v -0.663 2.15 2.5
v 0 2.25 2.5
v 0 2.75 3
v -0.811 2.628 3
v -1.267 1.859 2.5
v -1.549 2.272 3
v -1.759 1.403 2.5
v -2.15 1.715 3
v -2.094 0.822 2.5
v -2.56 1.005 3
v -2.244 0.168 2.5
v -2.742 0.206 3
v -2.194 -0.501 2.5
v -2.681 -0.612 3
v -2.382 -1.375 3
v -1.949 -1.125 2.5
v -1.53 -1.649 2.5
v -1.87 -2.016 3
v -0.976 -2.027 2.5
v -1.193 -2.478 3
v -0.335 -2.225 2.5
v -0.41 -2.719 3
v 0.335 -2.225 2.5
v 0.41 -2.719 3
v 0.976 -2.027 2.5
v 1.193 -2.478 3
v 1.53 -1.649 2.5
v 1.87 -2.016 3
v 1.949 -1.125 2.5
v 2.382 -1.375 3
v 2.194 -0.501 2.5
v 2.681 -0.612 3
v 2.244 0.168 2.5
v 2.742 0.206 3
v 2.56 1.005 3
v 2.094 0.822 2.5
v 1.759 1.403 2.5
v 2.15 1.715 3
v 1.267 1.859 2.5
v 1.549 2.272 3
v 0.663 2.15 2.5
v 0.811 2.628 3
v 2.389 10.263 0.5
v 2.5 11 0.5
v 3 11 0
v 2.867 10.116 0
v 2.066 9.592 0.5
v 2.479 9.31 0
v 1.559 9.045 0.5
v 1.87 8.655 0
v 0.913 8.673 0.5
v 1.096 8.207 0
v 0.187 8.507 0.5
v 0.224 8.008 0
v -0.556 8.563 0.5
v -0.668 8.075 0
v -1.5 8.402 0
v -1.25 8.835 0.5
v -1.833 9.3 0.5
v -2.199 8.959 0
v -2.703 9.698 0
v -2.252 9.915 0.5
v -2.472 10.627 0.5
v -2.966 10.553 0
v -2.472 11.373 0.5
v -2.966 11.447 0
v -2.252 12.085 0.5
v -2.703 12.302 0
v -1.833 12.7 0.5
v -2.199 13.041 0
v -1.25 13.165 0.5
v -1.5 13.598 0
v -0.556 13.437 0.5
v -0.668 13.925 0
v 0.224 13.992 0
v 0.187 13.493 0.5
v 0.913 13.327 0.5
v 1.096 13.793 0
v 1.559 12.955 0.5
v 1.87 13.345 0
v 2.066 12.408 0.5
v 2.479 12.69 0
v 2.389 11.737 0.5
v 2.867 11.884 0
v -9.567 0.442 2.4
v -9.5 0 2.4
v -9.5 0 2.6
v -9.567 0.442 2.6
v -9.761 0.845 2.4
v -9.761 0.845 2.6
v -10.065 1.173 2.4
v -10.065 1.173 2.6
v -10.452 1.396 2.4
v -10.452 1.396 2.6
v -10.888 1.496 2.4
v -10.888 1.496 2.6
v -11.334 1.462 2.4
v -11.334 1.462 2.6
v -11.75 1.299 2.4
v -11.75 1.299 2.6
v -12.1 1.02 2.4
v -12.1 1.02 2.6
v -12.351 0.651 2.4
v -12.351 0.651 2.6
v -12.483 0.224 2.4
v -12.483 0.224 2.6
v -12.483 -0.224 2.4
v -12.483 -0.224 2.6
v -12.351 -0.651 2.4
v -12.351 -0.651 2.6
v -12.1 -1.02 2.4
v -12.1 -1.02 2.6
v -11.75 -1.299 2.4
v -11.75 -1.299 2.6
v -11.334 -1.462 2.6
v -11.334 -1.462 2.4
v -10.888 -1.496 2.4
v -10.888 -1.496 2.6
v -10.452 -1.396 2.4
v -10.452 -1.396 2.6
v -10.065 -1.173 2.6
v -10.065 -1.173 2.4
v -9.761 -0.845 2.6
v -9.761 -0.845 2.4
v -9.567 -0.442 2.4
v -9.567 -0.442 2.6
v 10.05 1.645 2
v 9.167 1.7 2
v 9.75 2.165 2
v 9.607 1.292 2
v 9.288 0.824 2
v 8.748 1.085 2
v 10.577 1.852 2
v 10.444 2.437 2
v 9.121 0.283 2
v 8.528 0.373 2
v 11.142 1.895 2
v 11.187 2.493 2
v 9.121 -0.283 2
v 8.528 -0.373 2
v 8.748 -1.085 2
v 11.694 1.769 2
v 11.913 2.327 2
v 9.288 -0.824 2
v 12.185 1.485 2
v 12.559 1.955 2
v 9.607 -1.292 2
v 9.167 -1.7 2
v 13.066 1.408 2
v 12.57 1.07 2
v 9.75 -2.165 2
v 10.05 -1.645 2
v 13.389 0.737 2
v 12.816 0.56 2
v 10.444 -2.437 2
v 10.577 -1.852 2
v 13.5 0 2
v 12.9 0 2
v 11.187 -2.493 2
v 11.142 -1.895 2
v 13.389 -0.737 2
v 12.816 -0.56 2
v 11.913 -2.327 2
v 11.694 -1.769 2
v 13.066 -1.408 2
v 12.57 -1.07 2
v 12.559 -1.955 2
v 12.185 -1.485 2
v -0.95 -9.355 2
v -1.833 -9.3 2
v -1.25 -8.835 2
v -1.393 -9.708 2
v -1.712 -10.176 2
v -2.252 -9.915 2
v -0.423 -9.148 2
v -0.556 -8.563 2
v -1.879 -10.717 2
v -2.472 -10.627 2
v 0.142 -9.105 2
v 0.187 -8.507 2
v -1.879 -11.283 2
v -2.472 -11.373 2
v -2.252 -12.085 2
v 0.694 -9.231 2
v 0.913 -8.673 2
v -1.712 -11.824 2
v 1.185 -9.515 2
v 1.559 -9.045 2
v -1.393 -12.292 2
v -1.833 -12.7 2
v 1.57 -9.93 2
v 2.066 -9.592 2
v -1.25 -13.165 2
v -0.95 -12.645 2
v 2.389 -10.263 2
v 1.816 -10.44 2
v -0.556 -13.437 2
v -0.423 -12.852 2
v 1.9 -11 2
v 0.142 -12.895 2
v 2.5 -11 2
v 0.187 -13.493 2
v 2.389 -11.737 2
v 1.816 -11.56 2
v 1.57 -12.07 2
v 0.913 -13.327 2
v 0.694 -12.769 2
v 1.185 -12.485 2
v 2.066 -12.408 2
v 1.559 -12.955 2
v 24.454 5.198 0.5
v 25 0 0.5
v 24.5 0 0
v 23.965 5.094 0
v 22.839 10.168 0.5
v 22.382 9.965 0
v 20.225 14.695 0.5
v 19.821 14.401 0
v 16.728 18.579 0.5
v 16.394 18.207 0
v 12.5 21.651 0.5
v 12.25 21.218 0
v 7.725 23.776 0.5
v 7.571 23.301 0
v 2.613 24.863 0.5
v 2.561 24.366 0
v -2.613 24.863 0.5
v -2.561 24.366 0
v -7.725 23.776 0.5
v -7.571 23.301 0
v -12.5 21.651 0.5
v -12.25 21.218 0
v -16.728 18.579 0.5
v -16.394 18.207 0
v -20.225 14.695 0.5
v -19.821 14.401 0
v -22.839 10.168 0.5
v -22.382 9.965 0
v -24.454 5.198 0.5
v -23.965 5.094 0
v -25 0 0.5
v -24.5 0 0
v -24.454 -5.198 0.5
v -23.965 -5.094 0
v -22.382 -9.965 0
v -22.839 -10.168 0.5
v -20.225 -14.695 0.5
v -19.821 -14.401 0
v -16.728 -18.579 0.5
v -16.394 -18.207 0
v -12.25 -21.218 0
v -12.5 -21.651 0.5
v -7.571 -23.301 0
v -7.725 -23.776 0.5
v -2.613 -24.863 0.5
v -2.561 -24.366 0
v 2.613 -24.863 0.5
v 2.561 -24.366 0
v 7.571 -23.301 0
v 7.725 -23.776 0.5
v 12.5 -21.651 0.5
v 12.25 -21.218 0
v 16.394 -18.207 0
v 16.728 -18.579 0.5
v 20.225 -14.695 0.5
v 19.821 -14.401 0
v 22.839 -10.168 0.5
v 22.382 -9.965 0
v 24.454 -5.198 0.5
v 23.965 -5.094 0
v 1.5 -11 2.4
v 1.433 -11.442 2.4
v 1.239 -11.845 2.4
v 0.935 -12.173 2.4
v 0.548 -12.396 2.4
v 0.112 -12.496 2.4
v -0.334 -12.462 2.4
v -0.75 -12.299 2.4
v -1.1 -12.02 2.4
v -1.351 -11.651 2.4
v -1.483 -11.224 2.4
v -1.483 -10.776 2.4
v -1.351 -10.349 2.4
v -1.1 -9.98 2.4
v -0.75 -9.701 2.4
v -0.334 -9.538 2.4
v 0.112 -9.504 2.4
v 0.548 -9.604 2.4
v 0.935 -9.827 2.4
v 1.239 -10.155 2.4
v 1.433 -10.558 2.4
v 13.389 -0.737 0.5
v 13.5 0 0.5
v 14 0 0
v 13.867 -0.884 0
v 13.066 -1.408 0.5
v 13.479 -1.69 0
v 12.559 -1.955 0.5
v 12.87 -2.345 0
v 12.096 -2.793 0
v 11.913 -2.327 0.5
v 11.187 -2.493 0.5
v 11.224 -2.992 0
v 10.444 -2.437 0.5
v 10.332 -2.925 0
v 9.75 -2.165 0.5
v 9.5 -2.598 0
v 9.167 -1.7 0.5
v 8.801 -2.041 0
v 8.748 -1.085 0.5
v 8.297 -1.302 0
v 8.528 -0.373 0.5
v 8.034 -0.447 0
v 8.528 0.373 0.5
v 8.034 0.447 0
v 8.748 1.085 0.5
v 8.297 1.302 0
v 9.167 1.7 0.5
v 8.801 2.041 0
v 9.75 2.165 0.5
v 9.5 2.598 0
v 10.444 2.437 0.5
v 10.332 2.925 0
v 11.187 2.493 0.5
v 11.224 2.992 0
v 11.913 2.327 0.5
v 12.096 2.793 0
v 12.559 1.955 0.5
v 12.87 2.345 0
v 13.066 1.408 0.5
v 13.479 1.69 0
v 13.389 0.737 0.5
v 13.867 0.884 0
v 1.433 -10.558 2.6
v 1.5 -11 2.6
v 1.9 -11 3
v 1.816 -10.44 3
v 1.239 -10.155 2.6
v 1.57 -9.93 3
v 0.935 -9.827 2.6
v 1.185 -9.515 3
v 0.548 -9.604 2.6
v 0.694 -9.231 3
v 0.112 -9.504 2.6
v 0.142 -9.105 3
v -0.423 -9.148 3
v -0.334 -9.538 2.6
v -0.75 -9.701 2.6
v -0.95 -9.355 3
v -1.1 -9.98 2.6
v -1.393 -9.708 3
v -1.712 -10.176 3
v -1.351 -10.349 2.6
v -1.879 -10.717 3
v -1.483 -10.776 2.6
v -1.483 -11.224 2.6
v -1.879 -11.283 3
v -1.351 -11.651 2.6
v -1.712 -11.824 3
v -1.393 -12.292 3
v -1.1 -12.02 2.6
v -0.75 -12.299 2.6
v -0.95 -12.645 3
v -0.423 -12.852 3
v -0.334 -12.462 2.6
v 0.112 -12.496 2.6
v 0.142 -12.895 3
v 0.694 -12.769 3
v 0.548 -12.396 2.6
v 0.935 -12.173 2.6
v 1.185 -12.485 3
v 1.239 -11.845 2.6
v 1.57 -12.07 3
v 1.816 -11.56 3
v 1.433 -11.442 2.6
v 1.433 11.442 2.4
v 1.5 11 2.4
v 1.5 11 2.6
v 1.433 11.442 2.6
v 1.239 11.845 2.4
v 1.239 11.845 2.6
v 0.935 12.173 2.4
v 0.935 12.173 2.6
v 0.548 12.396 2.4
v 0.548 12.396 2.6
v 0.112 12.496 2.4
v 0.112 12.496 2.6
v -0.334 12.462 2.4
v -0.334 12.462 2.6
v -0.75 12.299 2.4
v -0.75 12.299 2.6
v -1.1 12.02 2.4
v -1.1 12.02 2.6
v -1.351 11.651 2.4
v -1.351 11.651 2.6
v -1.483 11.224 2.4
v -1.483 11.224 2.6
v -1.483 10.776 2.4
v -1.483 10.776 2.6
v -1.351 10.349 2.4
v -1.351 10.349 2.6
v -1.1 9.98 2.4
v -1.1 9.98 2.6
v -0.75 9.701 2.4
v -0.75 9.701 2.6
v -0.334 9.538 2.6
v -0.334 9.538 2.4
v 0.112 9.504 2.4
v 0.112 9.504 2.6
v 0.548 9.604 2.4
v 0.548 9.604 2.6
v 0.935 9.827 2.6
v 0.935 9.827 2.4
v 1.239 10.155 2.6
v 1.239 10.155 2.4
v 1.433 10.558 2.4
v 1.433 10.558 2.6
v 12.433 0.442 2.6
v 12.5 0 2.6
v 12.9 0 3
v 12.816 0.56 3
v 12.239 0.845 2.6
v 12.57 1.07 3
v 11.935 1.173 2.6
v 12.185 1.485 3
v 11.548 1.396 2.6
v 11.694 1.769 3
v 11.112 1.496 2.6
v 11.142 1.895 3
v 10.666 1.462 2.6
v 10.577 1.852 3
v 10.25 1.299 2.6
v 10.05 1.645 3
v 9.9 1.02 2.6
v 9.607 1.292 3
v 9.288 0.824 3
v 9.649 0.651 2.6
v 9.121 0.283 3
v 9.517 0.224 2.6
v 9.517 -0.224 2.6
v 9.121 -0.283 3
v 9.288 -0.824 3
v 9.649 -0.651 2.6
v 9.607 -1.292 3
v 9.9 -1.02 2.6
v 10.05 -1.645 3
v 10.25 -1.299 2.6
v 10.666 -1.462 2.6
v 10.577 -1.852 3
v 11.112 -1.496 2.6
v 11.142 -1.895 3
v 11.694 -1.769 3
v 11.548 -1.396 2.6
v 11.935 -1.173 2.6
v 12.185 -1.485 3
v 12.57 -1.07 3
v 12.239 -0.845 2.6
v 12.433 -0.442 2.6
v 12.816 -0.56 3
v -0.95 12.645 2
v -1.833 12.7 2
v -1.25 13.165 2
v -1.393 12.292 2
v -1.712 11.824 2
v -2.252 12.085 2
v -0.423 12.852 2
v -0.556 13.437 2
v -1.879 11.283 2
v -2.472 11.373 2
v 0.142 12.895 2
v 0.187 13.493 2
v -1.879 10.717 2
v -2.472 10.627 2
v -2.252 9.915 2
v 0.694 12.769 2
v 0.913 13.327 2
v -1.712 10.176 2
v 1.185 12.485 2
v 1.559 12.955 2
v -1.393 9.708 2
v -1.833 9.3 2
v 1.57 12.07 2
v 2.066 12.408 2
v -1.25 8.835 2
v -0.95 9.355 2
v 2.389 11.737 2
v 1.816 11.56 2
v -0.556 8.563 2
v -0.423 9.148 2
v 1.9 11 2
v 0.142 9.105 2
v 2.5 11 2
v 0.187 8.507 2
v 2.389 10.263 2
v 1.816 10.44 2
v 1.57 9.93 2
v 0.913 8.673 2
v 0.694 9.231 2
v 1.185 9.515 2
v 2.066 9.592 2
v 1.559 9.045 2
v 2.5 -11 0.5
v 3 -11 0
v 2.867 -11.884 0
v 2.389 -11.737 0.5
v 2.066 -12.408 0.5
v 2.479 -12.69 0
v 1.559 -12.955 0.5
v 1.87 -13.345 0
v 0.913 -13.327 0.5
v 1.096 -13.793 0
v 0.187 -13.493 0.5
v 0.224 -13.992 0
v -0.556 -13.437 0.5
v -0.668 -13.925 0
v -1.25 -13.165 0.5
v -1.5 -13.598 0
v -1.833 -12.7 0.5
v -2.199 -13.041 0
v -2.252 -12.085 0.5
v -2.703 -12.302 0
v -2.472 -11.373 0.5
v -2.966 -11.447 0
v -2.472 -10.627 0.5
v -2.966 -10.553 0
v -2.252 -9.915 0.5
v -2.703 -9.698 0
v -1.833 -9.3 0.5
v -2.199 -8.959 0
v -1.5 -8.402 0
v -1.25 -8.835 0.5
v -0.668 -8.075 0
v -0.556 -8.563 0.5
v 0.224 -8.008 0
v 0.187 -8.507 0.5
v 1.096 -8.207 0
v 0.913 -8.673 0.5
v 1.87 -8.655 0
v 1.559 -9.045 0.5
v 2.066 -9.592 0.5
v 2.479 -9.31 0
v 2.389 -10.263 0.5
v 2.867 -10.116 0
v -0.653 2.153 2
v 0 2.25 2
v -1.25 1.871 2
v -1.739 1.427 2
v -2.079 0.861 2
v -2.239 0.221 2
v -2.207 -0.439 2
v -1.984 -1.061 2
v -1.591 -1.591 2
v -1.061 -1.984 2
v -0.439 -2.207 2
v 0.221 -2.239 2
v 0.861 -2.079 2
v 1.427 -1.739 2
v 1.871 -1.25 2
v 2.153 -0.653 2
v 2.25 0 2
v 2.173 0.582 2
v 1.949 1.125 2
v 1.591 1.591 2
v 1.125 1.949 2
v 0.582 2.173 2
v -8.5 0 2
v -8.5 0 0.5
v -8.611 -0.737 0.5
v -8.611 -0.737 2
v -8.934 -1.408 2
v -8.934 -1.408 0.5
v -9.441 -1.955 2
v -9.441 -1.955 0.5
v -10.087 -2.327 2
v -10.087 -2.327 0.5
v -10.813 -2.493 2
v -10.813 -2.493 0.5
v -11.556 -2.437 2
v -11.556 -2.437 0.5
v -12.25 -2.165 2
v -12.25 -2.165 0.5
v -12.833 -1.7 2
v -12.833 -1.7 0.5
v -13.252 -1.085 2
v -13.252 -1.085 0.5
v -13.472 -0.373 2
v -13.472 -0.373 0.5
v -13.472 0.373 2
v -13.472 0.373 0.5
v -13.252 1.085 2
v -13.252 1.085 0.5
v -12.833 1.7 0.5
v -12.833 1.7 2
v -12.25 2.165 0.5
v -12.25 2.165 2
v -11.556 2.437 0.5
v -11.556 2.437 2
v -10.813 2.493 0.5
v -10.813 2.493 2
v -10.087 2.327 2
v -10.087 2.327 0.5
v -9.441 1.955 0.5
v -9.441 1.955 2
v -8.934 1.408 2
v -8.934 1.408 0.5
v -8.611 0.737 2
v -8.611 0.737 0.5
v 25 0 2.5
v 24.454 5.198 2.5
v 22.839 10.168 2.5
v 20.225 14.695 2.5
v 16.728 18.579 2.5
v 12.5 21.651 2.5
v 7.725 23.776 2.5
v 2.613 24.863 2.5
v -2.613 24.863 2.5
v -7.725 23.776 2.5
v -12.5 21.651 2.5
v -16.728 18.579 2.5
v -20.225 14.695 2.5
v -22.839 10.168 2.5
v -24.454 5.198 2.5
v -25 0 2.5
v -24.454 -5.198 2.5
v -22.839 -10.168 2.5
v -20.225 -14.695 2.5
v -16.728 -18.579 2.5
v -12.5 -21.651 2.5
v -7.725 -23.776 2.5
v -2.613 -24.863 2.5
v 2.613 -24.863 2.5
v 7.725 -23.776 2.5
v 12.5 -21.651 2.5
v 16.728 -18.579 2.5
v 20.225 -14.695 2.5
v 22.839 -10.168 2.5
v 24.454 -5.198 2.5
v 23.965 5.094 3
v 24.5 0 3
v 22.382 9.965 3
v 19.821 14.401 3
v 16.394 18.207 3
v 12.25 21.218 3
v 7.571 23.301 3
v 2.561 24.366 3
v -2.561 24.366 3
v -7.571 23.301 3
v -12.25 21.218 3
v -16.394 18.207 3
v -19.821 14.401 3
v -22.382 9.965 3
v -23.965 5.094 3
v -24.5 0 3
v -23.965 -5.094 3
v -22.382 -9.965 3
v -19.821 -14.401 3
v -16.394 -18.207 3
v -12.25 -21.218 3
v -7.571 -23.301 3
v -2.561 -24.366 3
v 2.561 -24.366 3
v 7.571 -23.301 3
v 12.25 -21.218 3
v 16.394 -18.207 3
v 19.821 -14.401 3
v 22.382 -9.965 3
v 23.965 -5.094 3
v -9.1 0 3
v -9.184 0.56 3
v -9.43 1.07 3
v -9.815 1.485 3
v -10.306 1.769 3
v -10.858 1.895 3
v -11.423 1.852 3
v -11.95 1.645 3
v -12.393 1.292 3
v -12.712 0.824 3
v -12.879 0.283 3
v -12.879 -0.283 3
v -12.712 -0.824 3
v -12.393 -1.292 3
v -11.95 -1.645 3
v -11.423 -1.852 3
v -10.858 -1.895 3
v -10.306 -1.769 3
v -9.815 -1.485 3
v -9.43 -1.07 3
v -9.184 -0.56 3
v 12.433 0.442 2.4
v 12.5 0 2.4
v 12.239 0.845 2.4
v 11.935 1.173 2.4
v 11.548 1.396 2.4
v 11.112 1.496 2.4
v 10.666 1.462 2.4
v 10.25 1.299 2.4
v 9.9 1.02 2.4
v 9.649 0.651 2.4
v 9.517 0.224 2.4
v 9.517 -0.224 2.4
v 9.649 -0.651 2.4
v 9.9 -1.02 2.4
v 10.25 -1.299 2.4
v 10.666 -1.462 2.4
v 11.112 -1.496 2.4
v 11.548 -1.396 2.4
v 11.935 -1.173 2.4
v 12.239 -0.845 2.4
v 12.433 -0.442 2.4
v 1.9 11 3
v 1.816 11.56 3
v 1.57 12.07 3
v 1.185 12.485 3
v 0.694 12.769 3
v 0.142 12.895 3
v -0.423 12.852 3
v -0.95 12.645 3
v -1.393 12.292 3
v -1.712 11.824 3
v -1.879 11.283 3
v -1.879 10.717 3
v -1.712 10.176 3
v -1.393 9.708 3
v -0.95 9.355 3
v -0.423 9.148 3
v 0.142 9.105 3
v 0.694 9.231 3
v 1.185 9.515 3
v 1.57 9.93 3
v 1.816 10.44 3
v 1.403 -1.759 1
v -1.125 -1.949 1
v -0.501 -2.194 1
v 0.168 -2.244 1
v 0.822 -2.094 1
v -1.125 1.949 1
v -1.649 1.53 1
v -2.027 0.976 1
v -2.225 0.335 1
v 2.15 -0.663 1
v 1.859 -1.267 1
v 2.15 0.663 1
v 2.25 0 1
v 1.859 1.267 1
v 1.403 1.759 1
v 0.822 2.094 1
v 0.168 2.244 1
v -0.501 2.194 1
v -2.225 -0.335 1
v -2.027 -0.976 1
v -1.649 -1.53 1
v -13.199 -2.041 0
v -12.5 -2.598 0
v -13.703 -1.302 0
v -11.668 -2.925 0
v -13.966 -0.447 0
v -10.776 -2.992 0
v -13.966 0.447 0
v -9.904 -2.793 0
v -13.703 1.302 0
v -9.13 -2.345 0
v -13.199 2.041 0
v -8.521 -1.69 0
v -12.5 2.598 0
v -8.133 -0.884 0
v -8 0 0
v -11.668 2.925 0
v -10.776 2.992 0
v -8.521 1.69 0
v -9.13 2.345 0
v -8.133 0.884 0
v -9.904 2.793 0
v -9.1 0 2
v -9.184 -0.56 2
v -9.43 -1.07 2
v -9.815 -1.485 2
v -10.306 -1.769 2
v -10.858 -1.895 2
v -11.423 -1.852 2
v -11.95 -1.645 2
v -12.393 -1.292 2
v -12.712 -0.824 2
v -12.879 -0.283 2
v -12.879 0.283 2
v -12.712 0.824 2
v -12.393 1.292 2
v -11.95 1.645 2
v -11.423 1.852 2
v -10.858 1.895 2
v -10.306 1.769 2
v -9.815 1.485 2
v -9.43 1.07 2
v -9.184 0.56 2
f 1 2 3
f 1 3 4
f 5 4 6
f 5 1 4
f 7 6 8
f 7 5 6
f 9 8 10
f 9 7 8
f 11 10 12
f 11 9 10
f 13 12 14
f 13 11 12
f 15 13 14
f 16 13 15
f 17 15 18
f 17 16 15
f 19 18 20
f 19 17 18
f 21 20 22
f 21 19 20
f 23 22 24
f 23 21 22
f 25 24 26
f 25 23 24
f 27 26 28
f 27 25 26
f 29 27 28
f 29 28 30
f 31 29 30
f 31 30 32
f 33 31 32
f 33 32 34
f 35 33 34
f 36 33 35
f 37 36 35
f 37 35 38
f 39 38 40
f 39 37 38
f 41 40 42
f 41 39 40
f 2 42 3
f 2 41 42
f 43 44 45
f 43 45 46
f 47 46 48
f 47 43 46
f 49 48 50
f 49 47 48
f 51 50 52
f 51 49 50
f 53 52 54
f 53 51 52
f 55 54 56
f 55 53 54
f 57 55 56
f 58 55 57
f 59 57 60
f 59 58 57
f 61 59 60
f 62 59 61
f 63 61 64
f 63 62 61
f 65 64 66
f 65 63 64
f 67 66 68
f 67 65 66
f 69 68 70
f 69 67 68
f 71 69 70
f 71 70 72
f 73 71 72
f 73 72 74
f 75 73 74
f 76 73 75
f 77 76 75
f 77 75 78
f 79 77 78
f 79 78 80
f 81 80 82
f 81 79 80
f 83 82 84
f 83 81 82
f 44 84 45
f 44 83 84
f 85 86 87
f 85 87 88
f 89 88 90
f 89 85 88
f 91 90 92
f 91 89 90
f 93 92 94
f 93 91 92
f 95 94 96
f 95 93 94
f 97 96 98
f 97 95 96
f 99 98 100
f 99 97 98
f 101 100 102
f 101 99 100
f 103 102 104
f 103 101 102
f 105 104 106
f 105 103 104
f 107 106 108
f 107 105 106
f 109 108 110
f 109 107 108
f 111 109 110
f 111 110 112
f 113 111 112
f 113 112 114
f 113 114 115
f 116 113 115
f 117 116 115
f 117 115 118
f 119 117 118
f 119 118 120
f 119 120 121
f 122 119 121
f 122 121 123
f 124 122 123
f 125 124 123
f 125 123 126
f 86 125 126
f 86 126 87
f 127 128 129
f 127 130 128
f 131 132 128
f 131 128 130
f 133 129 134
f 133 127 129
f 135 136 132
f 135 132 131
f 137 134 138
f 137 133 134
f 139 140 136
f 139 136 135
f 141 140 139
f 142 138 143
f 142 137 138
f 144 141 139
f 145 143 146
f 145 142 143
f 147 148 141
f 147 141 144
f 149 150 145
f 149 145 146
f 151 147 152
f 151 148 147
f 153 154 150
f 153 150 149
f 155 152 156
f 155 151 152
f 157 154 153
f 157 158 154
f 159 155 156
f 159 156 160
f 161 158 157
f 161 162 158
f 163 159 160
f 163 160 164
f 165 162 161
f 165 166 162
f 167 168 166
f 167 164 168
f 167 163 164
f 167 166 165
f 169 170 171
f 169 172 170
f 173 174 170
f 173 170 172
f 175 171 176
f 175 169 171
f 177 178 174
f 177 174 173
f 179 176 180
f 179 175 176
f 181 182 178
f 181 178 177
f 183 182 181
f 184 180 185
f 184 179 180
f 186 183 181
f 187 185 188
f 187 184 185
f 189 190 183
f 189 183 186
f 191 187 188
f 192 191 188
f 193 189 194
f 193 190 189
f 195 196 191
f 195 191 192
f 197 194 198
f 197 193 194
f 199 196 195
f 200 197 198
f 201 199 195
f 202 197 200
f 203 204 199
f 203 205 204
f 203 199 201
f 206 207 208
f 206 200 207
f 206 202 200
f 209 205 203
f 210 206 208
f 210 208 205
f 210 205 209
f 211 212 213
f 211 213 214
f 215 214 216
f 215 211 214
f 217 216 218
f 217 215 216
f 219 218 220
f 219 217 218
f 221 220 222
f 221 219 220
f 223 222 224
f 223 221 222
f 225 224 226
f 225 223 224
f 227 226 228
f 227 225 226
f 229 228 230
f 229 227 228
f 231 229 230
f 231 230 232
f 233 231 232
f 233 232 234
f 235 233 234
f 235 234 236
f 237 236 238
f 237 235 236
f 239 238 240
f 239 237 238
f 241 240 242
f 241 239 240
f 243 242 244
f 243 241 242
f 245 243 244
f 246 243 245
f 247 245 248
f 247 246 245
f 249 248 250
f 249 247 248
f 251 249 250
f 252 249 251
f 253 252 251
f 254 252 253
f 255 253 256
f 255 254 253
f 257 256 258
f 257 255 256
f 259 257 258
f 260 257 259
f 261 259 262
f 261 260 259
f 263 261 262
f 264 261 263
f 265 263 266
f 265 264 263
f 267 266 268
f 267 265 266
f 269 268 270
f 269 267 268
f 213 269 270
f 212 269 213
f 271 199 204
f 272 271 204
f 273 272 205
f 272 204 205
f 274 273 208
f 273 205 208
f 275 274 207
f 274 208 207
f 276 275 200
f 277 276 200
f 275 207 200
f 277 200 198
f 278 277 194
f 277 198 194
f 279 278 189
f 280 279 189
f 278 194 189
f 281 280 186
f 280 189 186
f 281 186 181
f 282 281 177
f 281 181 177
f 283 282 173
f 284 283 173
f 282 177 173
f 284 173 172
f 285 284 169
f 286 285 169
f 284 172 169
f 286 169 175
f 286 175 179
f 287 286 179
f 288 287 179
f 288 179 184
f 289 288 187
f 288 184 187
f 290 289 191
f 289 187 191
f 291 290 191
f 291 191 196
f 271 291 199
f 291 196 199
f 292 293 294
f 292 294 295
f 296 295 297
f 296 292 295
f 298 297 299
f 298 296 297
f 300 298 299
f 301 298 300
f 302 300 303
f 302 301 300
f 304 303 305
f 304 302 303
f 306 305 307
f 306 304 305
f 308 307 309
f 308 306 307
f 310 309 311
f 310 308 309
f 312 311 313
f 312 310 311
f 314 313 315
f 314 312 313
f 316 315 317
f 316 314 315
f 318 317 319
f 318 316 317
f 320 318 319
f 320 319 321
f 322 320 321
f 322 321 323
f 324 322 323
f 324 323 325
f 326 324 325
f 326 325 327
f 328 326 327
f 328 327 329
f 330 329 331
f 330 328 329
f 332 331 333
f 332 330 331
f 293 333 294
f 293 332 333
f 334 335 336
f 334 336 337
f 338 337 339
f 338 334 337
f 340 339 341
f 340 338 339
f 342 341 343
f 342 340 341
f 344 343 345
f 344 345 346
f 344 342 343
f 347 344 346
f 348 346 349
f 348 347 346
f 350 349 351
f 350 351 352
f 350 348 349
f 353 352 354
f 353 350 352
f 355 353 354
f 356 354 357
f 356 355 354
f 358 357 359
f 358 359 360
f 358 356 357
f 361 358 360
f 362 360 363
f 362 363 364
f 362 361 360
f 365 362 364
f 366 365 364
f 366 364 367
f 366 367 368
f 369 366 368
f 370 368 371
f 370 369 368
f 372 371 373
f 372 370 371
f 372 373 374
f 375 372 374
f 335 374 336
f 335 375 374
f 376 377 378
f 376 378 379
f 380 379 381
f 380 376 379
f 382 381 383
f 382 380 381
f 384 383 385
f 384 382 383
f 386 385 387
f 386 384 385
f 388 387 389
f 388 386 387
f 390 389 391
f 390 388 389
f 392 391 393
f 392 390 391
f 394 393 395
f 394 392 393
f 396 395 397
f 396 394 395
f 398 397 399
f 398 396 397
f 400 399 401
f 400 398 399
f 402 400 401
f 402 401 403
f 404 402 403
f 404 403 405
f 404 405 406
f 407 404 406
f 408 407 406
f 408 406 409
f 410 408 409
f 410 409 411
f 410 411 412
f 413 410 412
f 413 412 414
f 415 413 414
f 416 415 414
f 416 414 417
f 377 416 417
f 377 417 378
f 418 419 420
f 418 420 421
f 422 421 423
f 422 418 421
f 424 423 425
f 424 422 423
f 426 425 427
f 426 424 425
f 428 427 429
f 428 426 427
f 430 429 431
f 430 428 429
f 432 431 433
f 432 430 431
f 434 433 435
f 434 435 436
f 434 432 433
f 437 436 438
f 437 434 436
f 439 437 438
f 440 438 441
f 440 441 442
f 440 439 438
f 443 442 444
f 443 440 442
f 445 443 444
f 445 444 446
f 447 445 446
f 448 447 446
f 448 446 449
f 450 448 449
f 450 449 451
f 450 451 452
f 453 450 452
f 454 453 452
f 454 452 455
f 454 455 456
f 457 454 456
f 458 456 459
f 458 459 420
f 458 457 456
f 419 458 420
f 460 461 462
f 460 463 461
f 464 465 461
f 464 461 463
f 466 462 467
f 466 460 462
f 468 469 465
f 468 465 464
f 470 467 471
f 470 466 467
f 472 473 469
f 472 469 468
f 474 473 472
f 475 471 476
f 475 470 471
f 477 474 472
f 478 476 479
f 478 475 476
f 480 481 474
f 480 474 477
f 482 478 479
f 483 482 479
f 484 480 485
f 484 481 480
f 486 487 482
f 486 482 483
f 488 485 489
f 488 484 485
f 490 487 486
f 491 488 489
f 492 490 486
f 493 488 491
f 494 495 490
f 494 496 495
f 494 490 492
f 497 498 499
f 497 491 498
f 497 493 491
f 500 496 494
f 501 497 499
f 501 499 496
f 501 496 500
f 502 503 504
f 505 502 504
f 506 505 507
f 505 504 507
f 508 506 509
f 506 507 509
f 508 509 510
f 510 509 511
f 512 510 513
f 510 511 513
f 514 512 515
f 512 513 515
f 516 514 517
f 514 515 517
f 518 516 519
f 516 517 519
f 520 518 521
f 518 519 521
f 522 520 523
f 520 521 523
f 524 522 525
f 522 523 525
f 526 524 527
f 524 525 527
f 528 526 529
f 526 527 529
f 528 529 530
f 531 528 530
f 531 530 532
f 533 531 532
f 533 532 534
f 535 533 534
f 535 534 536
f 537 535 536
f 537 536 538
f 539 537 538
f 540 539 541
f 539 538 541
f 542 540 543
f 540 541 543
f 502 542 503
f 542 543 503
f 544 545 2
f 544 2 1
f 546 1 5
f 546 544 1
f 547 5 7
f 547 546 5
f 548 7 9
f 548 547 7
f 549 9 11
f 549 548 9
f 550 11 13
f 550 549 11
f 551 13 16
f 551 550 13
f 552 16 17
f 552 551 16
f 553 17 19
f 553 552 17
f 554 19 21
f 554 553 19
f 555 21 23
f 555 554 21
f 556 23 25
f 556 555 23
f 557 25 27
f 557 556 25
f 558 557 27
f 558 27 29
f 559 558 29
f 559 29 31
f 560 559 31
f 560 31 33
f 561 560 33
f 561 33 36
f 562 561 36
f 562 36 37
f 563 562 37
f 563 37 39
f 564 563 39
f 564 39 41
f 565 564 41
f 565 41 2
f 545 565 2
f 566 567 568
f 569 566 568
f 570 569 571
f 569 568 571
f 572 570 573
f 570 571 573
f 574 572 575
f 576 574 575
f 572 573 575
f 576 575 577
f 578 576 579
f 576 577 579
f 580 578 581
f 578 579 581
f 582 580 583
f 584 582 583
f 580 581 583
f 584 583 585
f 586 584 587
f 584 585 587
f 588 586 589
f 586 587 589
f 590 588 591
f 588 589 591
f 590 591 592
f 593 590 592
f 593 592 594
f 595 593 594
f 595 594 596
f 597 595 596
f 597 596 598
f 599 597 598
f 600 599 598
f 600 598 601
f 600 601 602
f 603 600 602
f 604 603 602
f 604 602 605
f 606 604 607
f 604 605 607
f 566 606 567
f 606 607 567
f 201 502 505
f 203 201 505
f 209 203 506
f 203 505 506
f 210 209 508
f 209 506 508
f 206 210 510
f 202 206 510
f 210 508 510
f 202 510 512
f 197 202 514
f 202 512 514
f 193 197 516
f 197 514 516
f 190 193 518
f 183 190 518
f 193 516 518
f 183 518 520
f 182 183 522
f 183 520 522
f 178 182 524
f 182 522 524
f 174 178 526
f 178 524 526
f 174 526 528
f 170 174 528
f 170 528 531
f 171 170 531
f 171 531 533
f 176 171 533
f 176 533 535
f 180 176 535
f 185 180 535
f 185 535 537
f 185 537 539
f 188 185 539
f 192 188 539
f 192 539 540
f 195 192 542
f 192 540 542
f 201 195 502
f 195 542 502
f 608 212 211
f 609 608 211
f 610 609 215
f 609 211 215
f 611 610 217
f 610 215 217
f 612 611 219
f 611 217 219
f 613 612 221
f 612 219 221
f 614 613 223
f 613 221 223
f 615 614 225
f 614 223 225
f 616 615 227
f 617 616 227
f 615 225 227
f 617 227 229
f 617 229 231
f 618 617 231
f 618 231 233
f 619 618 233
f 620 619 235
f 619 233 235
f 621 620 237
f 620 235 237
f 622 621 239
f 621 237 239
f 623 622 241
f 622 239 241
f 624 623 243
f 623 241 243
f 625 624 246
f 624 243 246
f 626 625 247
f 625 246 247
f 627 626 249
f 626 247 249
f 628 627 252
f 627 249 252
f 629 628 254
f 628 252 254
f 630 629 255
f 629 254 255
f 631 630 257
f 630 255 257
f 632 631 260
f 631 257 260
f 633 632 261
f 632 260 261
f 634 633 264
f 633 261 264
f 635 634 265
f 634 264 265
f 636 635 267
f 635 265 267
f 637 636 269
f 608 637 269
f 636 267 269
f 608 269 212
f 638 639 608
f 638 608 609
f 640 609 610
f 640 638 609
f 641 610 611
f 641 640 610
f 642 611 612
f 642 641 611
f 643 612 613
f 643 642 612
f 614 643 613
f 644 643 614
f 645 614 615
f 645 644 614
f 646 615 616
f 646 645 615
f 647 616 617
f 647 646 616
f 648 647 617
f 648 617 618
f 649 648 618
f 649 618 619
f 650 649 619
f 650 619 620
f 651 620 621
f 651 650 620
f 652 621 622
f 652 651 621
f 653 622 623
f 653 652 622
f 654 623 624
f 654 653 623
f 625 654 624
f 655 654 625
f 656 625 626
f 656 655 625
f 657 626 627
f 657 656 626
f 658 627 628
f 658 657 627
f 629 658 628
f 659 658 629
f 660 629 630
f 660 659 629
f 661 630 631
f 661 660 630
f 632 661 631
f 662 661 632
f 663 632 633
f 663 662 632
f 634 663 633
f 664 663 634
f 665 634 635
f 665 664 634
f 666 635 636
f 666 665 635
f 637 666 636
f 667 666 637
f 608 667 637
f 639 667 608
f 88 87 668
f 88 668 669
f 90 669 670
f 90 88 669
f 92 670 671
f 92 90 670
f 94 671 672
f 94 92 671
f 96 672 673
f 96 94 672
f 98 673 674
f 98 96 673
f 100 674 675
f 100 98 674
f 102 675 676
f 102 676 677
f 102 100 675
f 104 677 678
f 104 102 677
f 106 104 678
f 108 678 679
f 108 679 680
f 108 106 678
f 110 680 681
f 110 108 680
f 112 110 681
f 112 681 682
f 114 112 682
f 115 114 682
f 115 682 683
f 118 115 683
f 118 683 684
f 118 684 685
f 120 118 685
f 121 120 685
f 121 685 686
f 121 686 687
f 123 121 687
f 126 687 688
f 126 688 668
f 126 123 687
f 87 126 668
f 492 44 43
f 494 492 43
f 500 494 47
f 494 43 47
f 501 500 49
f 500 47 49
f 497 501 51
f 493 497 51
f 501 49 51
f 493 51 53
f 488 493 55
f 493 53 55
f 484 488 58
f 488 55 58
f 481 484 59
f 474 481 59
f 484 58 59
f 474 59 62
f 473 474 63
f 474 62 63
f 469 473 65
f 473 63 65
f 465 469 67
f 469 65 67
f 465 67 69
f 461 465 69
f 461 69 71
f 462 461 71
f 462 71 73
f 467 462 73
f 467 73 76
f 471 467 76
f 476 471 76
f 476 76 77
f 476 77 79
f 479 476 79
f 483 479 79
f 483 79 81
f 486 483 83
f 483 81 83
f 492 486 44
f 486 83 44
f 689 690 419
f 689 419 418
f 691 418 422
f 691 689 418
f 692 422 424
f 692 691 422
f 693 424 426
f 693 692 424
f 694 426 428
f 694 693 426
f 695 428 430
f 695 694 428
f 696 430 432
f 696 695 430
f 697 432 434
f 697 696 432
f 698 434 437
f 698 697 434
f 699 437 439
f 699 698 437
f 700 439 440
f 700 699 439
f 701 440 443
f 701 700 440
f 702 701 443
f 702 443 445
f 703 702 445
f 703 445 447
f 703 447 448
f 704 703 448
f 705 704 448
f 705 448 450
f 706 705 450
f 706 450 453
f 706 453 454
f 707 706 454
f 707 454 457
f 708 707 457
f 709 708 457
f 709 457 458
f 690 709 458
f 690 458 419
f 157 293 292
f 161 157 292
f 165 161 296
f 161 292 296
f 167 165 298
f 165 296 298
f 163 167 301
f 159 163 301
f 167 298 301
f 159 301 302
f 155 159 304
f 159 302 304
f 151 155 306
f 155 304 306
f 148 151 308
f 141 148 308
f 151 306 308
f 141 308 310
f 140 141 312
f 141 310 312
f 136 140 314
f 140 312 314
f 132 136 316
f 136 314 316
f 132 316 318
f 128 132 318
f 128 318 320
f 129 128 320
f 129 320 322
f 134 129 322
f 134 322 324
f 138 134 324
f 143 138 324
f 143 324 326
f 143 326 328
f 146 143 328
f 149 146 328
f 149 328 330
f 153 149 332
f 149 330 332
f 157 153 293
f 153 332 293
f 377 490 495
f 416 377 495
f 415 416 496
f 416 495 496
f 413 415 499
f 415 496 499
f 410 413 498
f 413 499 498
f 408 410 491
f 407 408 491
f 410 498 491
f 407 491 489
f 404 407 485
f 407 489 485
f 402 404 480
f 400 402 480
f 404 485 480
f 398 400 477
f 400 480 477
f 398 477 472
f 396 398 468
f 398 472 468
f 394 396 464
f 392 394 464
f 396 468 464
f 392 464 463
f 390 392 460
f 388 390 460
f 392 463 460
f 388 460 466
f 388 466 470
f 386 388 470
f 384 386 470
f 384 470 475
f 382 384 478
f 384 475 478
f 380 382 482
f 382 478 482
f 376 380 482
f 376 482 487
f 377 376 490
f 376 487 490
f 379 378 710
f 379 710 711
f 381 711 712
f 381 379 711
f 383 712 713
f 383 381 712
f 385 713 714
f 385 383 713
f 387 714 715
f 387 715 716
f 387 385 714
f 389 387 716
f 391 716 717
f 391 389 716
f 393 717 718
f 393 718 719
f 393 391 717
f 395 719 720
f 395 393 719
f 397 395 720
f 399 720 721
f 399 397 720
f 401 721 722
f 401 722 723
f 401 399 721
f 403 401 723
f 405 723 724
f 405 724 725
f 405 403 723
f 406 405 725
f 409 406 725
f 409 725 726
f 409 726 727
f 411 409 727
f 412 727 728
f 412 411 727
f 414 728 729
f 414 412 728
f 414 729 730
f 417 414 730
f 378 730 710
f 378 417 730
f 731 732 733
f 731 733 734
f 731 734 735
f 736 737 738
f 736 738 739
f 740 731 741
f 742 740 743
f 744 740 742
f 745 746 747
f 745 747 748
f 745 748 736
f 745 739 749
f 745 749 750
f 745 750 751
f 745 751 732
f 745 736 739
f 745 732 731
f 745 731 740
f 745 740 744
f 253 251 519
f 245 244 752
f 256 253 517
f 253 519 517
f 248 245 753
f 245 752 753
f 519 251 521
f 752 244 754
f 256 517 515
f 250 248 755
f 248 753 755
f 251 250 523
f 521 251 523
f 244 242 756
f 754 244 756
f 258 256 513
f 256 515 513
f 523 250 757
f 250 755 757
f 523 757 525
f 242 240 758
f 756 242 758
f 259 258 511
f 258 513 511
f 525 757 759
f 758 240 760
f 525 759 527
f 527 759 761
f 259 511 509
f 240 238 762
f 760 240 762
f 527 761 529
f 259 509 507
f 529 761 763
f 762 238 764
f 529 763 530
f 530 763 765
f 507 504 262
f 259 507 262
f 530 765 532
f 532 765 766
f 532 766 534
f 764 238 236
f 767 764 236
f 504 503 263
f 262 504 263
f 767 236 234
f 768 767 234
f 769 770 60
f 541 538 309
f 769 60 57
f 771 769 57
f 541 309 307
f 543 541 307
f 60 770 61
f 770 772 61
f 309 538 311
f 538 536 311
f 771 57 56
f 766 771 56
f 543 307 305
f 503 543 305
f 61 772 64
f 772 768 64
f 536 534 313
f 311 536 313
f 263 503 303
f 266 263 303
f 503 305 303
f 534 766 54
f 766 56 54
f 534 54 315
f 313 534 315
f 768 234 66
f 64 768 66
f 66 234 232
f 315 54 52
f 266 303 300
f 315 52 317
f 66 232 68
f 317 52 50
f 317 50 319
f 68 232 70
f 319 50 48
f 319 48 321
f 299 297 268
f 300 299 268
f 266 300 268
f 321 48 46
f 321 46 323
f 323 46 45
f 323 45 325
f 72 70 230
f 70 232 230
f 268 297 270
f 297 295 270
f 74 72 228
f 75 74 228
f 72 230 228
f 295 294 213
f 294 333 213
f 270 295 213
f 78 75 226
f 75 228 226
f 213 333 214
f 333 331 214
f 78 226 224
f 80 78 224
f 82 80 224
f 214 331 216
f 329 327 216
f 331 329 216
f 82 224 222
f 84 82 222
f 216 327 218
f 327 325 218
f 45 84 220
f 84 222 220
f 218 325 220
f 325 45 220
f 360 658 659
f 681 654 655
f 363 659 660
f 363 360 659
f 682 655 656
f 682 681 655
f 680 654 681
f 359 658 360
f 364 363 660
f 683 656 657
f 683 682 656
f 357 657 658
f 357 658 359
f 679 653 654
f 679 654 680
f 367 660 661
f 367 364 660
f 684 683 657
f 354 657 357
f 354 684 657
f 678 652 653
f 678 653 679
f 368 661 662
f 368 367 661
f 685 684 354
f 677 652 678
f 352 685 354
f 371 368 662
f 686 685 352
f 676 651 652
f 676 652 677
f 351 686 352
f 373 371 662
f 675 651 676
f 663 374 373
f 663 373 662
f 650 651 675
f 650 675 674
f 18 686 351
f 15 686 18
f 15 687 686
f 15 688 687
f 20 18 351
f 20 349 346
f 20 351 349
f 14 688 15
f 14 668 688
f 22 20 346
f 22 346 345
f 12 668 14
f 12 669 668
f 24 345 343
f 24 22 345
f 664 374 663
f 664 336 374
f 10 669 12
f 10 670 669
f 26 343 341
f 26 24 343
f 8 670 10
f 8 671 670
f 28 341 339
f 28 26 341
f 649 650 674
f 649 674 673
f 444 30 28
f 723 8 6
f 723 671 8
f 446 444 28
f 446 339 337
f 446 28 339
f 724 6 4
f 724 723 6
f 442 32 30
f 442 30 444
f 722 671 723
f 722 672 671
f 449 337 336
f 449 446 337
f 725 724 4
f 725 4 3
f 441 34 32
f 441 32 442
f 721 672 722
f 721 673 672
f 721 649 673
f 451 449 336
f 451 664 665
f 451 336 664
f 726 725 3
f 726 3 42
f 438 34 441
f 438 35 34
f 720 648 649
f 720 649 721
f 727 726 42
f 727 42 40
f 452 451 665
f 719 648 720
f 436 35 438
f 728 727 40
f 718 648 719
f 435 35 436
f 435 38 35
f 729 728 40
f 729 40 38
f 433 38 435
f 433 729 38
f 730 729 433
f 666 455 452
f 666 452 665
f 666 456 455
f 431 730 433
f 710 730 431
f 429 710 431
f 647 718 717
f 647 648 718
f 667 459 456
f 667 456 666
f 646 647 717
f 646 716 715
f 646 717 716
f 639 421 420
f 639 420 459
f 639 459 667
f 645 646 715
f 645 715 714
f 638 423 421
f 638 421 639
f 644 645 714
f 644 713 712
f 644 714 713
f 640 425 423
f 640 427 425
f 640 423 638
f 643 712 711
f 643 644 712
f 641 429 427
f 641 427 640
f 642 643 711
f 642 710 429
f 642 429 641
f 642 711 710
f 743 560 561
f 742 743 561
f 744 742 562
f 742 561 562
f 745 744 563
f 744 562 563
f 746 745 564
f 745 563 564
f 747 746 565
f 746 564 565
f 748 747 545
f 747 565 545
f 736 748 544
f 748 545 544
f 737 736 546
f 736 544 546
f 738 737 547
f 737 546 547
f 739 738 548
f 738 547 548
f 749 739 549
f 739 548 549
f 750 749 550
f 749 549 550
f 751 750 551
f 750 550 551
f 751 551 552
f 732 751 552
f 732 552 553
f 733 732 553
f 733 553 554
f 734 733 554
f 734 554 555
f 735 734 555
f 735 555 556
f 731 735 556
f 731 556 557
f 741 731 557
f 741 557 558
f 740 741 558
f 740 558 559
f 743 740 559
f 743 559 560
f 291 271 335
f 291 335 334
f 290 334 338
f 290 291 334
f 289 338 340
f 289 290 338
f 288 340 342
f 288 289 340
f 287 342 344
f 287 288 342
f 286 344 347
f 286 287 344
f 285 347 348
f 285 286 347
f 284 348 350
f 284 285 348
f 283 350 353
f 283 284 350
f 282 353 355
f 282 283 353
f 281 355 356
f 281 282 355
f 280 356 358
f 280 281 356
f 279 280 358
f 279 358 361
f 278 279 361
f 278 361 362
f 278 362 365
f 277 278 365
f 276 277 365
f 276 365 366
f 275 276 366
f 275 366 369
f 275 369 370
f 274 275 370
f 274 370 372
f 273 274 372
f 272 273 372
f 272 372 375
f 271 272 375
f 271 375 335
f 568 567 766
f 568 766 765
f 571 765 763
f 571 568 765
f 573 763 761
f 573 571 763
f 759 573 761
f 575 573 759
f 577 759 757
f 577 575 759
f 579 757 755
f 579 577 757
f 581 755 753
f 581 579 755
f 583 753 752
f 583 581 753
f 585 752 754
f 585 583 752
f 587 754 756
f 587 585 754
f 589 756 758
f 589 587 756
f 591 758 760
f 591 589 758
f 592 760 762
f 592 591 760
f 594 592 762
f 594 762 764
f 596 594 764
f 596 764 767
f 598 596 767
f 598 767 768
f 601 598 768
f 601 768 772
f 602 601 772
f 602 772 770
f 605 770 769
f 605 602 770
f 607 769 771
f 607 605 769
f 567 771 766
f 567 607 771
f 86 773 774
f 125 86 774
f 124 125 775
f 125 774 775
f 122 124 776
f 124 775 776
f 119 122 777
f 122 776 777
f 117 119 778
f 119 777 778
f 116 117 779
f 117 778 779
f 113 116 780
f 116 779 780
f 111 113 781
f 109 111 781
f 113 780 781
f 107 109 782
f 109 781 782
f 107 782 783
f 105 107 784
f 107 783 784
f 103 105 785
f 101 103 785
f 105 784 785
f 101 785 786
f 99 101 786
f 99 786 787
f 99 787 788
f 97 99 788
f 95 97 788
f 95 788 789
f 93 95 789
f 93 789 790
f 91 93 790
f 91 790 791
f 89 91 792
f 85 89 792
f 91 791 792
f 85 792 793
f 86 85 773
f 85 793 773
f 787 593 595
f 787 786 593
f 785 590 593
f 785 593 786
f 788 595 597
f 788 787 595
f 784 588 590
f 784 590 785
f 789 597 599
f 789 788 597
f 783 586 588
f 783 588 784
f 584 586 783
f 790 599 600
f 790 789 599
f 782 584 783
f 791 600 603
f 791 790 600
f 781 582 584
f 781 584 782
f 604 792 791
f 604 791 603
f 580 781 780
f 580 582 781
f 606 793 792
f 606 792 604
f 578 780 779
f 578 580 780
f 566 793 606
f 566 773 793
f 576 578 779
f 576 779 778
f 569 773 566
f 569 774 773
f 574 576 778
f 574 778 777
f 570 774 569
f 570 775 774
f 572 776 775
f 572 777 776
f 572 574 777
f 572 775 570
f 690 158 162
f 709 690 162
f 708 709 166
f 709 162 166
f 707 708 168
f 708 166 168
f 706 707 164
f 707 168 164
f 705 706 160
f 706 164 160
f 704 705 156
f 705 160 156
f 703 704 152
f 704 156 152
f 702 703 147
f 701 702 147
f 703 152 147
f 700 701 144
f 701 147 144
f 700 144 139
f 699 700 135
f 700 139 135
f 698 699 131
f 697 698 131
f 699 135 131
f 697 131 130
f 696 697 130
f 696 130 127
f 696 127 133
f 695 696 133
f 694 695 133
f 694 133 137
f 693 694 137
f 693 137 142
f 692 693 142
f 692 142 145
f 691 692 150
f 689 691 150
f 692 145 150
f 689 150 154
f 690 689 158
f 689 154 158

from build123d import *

# Parameters (mm, degrees)
SKETCH_R             = 25
SKETCH_R_2           = 1.5
PAD_DEPTH            = 3
SKETCH002_R          = 2.25
POCKET_DEPTH         = 2
SKETCH001_R          = 5
POCKET001_DEPTH      = 1
SKETCH003_R          = 2.5
POCKET002_DEPTH      = 2
POCKET002_FACE17_R   = 5
POCKET002_FACE17_R_2 = 2.25
PAD001_DEPTH         = 1
CHAMFER_SIZE         = 0.4
CHAMFER001_SIZE      = 0.5
CHAMFER002_SIZE      = 0.4
CHAMFER003_SIZE      = 0.5
CHAMFER004_SIZE      = 0.5


with BuildPart() as part:
    # Sketch → Pad (new body)
    with BuildSketch(Plane.XY):
        Circle(SKETCH_R)
        with Locations((0, 11)):
            Circle(SKETCH_R_2, mode=Mode.SUBTRACT)
        with Locations((-11, 0)):
            Circle(SKETCH_R_2, mode=Mode.SUBTRACT)
        with Locations((0, -11)):
            Circle(SKETCH_R_2, mode=Mode.SUBTRACT)
        with Locations((11, 0)):
            Circle(SKETCH_R_2, mode=Mode.SUBTRACT)
    extrude(amount=PAD_DEPTH)

    # Sketch002 (on Face7 of Pad) → Pocket (cut)
    with BuildSketch(Plane.XY.offset(3)):
        Circle(SKETCH002_R)
    extrude(amount=-POCKET_DEPTH, mode=Mode.SUBTRACT)

    # Sketch001 (on Face7 of Pad) → Pocket001 (cut)
    with BuildSketch(Plane.XY.offset(3)):
        Circle(SKETCH001_R)
    extrude(amount=-POCKET001_DEPTH, mode=Mode.SUBTRACT)

    # Sketch003 (on Face2 of Pocket001) → Pocket002 (cut)
    with BuildSketch(Plane(origin=(0, 0, 0), x_dir=(1, 0, 0), z_dir=(0, 0, -1))):
        with Locations((0, 11)):
            Circle(SKETCH003_R)
        with Locations((11, 0)):
            Circle(SKETCH003_R)
        with Locations((0, -11)):
            Circle(SKETCH003_R)
        with Locations((-11, 0)):
            Circle(SKETCH003_R)
    extrude(amount=-POCKET002_DEPTH, mode=Mode.SUBTRACT)

    # Pocket002 Face17 → Pad001 (add)
    with BuildSketch(Plane(origin=(0, 0, 2), x_dir=(0, 1, 0), z_dir=(0, 0, 1))):
        Circle(POCKET002_FACE17_R)
        Circle(POCKET002_FACE17_R_2, mode=Mode.SUBTRACT)
    extrude(amount=PAD001_DEPTH)

    # Chamfer
    chamfer_edges = [part.edges().sort_by_distance(p)[0] for p in [
        (-1.5, -11, 3),
        (-12.5, 0, 3),
        (-1.5, 11, 3),
        (9.5, 0, 3),
    ]]
    chamfer(chamfer_edges, length=CHAMFER_SIZE)

    # Chamfer001
    chamfer001_edges = [part.edges().sort_by_distance(p)[0] for p in [
        (-2.25, 0, 3),
    ]]
    chamfer(chamfer001_edges, length=CHAMFER001_SIZE)

    # Chamfer002
    chamfer002_edges = [part.edges().sort_by_distance(p)[0] for p in [
        (9.5, 0, 2),
        (-1.5, -11, 2),
        (-12.5, 0, 2),
        (-1.5, 11, 2),
    ]]
    chamfer(chamfer002_edges, length=CHAMFER002_SIZE)

    # Chamfer003
    chamfer003_edges = [part.edges().sort_by_distance(p)[0] for p in [
        (-2.5, -11, 0),
        (8.5, 0, 0),
        (-13.5, 0, 0),
        (-2.5, 11, 0),
    ]]
    chamfer(chamfer003_edges, length=CHAMFER003_SIZE)

    # Chamfer004
    chamfer004_edges = [part.edges().sort_by_distance(p)[0] for p in [
        (-25, 0, 0),
        (-25, 0, 3),
    ]]
    chamfer(chamfer004_edges, length=CHAMFER004_SIZE)


solid = part.part
